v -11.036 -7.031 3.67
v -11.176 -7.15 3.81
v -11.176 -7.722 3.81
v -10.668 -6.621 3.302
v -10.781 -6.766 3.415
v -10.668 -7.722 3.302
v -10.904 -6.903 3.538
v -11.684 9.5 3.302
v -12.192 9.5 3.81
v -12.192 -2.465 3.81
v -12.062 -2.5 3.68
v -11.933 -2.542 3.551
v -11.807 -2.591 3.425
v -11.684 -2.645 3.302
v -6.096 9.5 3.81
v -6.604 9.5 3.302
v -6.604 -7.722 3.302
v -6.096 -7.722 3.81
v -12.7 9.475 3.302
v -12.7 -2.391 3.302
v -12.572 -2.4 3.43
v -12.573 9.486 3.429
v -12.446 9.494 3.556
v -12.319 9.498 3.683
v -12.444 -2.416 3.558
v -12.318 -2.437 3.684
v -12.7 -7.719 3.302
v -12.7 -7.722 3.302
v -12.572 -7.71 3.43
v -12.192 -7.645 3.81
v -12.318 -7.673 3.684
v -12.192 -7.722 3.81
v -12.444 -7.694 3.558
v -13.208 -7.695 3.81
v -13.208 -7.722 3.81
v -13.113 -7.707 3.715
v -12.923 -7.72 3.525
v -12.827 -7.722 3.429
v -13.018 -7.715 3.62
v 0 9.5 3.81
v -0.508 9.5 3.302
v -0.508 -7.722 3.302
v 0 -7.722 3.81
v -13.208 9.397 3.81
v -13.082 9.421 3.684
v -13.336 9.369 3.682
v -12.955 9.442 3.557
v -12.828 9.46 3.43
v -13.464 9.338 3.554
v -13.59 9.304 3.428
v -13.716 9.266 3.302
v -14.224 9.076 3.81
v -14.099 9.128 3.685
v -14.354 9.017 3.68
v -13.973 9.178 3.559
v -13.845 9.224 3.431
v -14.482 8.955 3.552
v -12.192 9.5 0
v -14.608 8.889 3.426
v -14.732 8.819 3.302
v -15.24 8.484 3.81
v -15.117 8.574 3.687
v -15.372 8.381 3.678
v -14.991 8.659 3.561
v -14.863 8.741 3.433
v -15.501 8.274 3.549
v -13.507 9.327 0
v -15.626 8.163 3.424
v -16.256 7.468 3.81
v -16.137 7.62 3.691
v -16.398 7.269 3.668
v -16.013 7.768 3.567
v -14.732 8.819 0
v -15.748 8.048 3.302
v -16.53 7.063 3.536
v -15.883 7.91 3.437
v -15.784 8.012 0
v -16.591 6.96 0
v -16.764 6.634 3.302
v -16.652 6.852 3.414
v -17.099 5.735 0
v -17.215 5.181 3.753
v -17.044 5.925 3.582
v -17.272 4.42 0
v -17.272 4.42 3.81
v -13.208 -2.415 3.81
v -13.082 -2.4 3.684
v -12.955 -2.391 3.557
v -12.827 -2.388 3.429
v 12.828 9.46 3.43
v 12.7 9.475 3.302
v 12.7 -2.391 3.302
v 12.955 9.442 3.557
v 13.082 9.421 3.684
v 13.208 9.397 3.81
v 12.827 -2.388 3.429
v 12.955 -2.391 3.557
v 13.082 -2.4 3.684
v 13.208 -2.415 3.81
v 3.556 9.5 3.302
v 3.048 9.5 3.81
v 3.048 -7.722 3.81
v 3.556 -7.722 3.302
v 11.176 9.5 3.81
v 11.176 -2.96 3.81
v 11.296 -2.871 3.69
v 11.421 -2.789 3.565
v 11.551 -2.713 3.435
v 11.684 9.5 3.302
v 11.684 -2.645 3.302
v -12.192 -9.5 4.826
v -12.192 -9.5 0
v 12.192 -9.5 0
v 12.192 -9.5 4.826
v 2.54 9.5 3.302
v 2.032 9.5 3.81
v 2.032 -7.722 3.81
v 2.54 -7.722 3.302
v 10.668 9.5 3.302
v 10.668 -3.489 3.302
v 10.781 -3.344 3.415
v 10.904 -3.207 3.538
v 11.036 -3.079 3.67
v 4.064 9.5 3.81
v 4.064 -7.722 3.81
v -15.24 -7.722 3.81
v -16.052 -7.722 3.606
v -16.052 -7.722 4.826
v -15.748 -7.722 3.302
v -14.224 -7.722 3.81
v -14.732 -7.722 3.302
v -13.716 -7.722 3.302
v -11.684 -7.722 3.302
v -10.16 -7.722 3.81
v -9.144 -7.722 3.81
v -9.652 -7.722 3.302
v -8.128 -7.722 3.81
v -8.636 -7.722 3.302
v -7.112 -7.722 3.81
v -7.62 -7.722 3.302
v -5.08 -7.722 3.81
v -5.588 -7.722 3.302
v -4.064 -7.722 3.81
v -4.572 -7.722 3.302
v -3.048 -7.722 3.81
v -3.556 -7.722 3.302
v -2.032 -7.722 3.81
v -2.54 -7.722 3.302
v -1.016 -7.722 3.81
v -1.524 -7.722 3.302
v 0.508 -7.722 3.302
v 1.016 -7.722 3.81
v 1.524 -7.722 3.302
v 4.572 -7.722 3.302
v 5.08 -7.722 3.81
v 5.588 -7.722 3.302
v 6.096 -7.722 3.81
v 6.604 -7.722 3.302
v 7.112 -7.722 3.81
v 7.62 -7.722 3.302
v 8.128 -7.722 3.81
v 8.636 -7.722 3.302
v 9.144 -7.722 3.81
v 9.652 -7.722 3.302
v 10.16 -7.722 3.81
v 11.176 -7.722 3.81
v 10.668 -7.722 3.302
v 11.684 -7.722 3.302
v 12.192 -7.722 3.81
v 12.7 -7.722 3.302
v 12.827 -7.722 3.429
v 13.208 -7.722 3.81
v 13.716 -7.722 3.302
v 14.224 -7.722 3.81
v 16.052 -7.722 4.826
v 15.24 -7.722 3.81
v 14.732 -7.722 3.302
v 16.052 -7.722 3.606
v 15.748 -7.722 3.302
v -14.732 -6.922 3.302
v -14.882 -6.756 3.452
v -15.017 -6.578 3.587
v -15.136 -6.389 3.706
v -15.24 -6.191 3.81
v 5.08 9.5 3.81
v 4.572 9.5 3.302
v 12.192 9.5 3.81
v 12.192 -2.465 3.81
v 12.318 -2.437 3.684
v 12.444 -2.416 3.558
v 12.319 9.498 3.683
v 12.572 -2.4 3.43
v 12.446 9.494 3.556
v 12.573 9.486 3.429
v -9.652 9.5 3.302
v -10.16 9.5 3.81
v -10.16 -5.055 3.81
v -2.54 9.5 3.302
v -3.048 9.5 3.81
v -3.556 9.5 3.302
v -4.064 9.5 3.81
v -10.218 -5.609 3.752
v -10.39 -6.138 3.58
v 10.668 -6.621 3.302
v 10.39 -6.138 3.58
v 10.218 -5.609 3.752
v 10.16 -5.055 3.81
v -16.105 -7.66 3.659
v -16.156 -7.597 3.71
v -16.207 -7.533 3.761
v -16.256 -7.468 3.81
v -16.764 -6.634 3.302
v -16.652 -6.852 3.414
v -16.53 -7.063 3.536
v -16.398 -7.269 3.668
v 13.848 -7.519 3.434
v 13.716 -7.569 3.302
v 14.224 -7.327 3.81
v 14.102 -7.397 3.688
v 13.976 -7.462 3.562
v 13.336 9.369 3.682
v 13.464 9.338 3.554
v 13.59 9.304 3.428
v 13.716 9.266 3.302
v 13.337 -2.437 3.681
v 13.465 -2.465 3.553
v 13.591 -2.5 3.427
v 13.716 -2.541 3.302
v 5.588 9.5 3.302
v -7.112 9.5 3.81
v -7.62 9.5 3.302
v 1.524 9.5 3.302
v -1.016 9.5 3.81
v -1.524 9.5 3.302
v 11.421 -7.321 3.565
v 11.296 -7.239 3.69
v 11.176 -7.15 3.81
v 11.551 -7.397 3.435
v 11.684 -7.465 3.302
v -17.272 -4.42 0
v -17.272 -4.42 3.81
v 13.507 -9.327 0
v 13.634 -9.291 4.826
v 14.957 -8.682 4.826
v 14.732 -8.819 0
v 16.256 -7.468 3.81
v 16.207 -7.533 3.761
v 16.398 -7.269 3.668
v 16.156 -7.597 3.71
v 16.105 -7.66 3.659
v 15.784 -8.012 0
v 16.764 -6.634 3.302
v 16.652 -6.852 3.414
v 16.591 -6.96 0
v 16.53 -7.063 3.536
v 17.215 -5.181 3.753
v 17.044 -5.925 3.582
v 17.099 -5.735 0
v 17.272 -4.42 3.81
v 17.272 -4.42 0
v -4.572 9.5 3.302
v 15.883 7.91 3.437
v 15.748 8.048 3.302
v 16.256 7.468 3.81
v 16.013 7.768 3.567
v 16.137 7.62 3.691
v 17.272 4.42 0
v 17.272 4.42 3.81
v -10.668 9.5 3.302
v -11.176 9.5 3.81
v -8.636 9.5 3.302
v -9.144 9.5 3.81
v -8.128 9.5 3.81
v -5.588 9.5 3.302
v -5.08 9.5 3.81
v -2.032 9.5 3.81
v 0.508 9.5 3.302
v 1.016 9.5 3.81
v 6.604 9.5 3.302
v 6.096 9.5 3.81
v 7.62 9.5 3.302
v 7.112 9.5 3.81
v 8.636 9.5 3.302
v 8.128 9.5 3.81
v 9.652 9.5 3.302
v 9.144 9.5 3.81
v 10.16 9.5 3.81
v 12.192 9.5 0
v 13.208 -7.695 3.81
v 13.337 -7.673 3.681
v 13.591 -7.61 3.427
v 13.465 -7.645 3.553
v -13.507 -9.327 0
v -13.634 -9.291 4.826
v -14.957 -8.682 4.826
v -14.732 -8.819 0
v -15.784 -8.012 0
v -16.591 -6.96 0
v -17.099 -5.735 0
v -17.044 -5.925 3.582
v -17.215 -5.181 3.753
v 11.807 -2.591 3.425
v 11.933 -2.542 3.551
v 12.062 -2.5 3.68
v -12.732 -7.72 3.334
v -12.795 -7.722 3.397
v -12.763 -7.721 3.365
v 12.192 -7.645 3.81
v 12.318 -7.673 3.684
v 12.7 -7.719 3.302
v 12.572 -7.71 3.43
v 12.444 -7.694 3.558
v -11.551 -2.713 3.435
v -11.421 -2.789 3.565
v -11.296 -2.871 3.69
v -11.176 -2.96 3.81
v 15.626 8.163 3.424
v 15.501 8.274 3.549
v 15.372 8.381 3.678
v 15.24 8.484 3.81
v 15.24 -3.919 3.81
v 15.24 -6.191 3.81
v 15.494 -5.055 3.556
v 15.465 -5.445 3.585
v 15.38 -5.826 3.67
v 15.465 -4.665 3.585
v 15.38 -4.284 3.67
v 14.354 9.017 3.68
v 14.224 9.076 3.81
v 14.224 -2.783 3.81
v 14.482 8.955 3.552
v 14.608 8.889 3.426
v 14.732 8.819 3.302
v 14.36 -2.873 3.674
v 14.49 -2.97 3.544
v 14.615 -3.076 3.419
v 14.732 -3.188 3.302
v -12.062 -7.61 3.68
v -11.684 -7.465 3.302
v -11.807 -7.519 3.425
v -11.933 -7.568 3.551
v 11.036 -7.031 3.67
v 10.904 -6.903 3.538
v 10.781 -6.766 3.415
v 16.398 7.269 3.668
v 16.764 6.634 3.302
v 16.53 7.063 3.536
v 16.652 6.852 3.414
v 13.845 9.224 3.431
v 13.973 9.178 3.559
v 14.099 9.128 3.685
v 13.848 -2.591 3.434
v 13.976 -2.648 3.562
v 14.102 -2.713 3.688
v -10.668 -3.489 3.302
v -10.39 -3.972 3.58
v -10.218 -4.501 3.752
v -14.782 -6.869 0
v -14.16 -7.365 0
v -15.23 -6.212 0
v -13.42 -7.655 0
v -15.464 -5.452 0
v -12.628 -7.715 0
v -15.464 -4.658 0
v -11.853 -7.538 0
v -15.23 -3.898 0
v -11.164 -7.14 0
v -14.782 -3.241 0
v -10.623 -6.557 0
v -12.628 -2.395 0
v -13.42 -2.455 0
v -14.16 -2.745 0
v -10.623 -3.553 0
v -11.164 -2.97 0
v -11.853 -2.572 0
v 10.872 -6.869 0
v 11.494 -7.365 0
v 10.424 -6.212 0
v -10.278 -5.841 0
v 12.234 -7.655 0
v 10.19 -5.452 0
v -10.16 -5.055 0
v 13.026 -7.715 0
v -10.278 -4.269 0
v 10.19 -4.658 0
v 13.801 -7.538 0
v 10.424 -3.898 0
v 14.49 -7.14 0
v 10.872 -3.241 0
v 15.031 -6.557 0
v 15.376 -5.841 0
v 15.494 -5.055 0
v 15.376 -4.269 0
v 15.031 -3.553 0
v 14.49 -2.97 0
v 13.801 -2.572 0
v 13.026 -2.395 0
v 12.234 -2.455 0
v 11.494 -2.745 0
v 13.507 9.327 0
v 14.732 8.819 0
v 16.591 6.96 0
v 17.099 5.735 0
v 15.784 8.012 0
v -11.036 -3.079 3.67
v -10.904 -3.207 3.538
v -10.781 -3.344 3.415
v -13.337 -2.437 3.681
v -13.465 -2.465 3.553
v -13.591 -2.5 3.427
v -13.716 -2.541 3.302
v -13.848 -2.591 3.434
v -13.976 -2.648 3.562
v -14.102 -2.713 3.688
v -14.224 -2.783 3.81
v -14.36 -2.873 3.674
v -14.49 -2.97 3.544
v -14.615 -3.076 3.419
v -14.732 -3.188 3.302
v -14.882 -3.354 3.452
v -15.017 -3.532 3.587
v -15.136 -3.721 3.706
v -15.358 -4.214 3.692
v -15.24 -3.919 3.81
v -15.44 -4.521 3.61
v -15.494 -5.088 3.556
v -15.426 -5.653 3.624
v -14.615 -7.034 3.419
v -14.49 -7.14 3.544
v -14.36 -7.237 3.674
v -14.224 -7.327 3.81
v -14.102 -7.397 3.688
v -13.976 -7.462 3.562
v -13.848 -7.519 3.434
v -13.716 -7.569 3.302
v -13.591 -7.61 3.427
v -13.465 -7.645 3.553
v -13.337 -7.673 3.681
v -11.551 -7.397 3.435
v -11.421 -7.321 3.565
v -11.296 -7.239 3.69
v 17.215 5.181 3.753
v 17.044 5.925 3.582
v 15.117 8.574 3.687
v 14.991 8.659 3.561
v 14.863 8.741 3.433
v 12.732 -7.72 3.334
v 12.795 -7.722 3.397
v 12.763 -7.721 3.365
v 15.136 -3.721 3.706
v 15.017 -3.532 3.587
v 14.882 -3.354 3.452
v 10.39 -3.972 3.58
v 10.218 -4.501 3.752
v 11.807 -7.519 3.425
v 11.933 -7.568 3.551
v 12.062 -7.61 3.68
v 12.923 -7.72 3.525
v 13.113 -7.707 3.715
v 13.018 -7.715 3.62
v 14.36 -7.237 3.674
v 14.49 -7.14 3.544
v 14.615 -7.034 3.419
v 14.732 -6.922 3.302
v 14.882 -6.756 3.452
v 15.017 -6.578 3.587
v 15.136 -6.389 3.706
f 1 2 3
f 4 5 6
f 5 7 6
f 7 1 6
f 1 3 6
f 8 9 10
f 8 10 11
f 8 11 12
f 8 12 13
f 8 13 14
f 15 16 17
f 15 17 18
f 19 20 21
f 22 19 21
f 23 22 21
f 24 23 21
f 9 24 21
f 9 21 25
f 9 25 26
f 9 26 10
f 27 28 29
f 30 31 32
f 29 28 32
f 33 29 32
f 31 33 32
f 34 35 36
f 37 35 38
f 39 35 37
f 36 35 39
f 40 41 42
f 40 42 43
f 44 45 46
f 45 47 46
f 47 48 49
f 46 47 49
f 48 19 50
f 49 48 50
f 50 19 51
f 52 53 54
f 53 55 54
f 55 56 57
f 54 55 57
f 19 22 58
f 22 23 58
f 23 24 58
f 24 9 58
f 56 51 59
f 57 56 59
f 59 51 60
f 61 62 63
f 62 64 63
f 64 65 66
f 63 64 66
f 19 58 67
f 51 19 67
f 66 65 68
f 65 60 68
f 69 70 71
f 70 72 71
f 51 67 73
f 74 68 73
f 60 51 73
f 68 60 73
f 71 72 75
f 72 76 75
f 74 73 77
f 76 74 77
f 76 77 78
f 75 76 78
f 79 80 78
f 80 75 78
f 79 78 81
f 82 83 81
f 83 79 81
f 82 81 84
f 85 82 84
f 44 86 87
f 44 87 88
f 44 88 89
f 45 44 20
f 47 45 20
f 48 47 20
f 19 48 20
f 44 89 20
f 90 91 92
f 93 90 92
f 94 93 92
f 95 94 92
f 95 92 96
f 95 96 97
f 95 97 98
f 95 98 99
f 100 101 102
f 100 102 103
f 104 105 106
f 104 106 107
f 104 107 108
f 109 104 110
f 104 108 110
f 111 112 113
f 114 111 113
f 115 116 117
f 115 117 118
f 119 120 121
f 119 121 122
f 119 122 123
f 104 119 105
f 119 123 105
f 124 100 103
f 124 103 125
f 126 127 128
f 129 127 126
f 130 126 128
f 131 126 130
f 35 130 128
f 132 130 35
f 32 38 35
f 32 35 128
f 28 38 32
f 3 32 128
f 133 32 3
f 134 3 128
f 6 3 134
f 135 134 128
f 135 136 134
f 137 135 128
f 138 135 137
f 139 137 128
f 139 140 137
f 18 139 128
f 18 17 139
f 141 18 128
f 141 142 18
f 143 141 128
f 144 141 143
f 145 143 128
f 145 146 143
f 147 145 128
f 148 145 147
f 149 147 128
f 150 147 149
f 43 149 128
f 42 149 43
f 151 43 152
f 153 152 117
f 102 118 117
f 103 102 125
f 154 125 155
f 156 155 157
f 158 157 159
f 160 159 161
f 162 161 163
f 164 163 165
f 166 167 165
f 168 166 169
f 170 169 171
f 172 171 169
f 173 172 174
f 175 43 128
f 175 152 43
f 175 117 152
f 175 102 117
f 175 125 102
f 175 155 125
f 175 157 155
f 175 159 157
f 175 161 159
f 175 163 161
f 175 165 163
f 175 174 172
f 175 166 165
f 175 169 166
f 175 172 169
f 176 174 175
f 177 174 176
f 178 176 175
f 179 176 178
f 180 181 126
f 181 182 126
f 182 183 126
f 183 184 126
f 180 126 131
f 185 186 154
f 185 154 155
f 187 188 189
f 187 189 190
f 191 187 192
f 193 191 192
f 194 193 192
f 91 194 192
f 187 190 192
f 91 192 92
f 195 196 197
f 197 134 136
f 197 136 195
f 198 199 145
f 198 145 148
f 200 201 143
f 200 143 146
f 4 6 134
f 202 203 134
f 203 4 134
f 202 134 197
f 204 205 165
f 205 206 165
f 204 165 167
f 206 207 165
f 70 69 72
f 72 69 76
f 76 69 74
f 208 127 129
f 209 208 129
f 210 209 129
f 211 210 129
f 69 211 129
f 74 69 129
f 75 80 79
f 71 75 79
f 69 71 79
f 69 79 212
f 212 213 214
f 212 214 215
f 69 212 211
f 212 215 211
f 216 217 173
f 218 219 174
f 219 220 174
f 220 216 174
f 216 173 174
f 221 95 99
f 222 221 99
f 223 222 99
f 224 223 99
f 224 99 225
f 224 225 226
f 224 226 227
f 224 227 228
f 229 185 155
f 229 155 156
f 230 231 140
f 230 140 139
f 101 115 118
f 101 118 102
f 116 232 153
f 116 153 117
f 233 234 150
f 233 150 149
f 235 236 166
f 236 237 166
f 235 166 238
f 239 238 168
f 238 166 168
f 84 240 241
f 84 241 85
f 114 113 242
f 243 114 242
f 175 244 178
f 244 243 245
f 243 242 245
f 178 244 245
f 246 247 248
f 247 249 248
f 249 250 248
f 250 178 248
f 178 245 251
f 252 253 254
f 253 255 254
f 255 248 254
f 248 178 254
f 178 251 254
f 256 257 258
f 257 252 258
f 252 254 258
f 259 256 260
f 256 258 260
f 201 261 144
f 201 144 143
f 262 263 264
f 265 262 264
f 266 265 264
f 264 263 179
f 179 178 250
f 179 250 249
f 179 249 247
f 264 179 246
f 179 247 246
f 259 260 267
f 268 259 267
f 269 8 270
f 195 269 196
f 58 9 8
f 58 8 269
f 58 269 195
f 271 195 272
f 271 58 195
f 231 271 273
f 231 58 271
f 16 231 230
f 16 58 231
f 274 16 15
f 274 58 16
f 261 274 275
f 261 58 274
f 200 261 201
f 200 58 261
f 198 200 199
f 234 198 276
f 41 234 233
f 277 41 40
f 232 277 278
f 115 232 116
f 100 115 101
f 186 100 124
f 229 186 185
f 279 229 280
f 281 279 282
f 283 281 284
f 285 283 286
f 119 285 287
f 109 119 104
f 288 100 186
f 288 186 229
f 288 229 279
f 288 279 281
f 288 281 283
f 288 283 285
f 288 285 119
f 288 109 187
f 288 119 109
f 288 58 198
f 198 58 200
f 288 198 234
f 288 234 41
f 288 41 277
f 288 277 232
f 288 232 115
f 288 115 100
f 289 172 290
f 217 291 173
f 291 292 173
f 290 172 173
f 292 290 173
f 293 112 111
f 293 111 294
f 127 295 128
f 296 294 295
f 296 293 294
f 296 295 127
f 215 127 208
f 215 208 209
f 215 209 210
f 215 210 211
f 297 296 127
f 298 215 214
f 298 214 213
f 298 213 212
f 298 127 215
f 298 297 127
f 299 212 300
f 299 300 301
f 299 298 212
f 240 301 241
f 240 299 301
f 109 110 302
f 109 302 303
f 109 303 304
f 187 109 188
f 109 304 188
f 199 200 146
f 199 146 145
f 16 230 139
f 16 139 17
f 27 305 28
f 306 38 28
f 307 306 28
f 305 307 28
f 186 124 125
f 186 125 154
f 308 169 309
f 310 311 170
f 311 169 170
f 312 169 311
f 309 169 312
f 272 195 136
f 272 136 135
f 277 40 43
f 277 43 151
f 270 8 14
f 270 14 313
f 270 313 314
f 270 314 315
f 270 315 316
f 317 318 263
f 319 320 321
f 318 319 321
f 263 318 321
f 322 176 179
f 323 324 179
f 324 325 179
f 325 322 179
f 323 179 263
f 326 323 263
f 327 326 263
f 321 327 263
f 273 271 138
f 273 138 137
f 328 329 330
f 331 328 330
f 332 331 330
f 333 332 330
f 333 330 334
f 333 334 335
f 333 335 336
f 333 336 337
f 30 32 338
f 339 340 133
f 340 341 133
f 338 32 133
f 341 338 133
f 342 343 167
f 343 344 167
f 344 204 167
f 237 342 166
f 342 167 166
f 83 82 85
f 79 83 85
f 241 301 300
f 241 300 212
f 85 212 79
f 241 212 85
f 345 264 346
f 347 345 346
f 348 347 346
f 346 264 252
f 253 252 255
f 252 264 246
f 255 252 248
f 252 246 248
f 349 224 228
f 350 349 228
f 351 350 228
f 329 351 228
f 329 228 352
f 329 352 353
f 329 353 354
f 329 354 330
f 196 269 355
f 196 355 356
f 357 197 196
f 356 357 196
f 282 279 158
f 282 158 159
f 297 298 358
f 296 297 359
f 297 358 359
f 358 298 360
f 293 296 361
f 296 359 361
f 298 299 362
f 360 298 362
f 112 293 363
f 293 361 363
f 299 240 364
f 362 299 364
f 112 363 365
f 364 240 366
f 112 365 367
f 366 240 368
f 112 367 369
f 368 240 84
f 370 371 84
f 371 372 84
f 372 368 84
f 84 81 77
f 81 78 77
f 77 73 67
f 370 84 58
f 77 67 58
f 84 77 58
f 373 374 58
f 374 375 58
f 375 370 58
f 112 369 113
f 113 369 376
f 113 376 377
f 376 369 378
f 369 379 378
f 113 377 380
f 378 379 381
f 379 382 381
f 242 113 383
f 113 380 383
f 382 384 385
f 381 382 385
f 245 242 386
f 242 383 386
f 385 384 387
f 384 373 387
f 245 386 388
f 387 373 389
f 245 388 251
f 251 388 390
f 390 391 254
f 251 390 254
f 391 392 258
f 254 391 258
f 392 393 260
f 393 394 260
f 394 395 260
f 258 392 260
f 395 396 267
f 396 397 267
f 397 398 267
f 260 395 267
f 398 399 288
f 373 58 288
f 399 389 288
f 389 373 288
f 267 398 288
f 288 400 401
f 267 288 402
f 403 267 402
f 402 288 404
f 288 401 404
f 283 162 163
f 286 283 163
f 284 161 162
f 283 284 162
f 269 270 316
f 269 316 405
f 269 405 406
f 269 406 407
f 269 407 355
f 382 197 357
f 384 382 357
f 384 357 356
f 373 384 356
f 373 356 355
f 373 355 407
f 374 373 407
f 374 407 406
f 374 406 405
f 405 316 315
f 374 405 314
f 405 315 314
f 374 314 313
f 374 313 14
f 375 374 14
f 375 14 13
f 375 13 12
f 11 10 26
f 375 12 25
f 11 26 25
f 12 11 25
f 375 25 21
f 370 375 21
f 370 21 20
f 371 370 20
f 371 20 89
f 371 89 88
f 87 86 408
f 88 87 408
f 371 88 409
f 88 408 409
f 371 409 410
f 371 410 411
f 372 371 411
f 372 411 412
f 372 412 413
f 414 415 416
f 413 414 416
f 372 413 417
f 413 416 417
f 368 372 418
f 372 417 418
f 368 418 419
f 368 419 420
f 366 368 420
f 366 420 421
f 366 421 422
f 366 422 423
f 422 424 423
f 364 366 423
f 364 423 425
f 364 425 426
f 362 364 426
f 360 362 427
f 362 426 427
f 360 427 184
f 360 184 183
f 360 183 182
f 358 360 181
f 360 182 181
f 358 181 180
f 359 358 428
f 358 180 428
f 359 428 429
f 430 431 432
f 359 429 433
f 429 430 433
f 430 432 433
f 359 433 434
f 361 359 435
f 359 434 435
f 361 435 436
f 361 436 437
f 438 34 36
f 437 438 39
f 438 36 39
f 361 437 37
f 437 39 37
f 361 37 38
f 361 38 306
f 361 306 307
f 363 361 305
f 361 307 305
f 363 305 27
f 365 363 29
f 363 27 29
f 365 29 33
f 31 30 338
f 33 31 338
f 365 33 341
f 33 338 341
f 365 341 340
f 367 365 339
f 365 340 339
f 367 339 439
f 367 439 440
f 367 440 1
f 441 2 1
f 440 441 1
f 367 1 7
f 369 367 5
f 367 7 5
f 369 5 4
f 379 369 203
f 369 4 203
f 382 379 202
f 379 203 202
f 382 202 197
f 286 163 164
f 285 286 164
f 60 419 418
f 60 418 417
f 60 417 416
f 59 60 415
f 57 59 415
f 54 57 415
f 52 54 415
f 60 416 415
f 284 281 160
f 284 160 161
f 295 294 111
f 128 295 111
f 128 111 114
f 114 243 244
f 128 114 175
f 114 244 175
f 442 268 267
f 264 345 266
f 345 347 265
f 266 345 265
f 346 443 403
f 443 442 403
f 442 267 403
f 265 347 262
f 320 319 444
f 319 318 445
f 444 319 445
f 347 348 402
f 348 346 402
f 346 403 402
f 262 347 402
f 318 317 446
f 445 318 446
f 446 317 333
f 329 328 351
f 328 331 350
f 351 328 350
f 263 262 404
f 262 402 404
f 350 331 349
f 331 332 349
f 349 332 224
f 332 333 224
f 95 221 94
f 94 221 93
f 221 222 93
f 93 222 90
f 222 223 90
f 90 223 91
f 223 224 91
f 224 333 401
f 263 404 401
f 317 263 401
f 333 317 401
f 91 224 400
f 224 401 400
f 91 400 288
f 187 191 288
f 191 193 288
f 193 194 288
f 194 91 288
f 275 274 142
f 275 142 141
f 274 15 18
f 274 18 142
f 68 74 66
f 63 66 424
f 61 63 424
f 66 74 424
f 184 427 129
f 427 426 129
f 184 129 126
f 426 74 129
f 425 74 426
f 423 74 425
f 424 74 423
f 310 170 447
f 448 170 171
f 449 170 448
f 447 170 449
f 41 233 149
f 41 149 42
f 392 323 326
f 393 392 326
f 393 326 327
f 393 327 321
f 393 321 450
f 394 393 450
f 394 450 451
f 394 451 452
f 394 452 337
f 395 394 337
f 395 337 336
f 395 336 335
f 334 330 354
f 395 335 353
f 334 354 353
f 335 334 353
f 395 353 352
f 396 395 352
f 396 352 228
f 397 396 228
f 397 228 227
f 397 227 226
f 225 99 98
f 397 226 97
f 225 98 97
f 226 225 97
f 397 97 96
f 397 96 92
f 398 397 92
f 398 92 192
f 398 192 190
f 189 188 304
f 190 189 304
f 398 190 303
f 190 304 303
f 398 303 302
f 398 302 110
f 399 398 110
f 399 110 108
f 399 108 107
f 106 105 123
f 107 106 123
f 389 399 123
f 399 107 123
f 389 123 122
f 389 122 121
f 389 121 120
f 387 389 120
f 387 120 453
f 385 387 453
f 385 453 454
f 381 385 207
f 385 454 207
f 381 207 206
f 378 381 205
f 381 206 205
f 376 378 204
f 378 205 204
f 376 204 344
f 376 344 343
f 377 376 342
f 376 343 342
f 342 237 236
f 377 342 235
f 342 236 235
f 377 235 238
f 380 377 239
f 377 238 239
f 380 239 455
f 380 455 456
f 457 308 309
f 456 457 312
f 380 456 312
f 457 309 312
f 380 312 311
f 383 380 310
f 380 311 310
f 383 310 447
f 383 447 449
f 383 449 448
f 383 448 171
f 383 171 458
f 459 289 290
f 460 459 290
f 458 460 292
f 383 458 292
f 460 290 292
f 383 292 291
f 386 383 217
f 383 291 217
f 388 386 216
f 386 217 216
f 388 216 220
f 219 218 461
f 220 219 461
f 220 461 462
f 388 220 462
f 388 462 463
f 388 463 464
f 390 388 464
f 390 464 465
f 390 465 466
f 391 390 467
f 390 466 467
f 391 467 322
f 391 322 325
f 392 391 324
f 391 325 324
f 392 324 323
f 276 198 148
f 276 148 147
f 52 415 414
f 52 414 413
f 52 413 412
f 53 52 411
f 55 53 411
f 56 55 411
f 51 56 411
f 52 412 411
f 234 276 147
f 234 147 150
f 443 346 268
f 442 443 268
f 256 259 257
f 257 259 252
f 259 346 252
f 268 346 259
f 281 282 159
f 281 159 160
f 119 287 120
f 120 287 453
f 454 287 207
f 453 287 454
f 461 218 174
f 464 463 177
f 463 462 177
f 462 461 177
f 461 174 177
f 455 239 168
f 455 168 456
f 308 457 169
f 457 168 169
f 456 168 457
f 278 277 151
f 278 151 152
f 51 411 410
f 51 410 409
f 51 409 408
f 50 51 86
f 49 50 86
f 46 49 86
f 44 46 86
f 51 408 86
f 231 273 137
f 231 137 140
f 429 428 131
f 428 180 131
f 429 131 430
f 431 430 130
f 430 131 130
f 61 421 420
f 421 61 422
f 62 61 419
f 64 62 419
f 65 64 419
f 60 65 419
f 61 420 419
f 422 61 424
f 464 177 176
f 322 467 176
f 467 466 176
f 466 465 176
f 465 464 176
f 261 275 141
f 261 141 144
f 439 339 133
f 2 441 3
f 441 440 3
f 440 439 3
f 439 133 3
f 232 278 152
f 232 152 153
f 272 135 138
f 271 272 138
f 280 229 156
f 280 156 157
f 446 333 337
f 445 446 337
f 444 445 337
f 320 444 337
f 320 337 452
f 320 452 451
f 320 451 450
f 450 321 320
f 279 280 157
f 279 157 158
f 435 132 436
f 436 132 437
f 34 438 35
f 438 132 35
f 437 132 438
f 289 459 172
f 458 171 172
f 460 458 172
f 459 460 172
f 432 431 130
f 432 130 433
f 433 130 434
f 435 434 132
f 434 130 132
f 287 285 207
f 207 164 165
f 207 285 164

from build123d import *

# Parameters (mm, degrees)
F0_W        = 34.544
F0_H        = 19
F1_DEPTH    = 3.81
F3_R        = 2.667
F4_DEPTH    = 10.16
F6_DEPTH    = 19.001
F7_W        = 34.544
F7_H        = 1.778
F8_DEPTH    = 4.826
F9_T1_DEPTH = 30.226
F9_T3_DEPTH = 29.21


# Not quite as in the source:
# - a fillet or chamfer that OpenCascade refuses, or shapes differently, is made with other operations: its cross-section is extruded or revolved along the edge and cut away or added


with BuildPart() as f1:
    # F0 (on Top) → F1 (new body)
    with BuildSketch(Plane.XY):
        Rectangle(F0_W, F0_H)
    extrude(amount=F1_DEPTH)

    # F3 (on face) → F4 (cut)
    with BuildSketch(Plane.XY.offset(3.81)):
        with Locations((-12.827, -5.055)):
            Circle(F3_R)
        with Locations((12.827, -5.055)):
            Circle(F3_R)
    extrude(amount=-F4_DEPTH, mode=Mode.SUBTRACT)

    # F5 (on face) → F6 (cut, through all)
    with BuildSketch(Plane.XZ.offset(9.5)):
        Polygon((-17.78, 3.302), (-17.272, 3.81), (-18.288, 3.81), align=None)
        Polygon((-16.764, 3.302), (-16.256, 3.81), (-17.272, 3.81), align=None)
        Polygon((-15.748, 3.302), (-15.24, 3.81), (-16.256, 3.81), align=None)
        Polygon((-14.732, 3.302), (-14.224, 3.81), (-15.24, 3.81), align=None)
        Polygon((-13.716, 3.302), (-13.208, 3.81), (-14.224, 3.81), align=None)
        Polygon((-12.7, 3.302), (-12.192, 3.81), (-13.208, 3.81), align=None)
        Polygon((-11.684, 3.302), (-11.176, 3.81), (-12.192, 3.81), align=None)
        Polygon((-10.668, 3.302), (-10.16, 3.81), (-11.176, 3.81), align=None)
        Polygon((-9.652, 3.302), (-9.144, 3.81), (-10.16, 3.81), align=None)
        Polygon((-8.636, 3.302), (-8.128, 3.81), (-9.144, 3.81), align=None)
        Polygon((-7.62, 3.302), (-7.112, 3.81), (-8.128, 3.81), align=None)
        Polygon((-6.604, 3.302), (-6.096, 3.81), (-7.112, 3.81), align=None)
        Polygon((-5.588, 3.302), (-5.08, 3.81), (-6.096, 3.81), align=None)
        Polygon((-4.572, 3.302), (-4.064, 3.81), (-5.08, 3.81), align=None)
        Polygon((-3.556, 3.302), (-3.048, 3.81), (-4.064, 3.81), align=None)
        Polygon((-2.54, 3.302), (-2.032, 3.81), (-3.048, 3.81), align=None)
        Polygon((-1.524, 3.302), (-1.016, 3.81), (-2.032, 3.81), align=None)
        Polygon((-0.508, 3.302), (0, 3.81), (-1.016, 3.81), align=None)
        Polygon((0.508, 3.302), (1.016, 3.81), (0, 3.81), align=None)
        Polygon((1.524, 3.302), (2.032, 3.81), (1.016, 3.81), align=None)
        Polygon((2.54, 3.302), (3.048, 3.81), (2.032, 3.81), align=None)
        Polygon((3.556, 3.302), (4.064, 3.81), (3.048, 3.81), align=None)
        Polygon((4.572, 3.302), (5.08, 3.81), (4.064, 3.81), align=None)
        Polygon((5.588, 3.302), (6.096, 3.81), (5.08, 3.81), align=None)
        Polygon((6.604, 3.302), (7.112, 3.81), (6.096, 3.81), align=None)
        Polygon((7.62, 3.302), (8.128, 3.81), (7.112, 3.81), align=None)
        Polygon((8.636, 3.302), (9.144, 3.81), (8.128, 3.81), align=None)
        Polygon((9.652, 3.302), (10.16, 3.81), (9.144, 3.81), align=None)
        Polygon((10.668, 3.302), (11.176, 3.81), (10.16, 3.81), align=None)
        Polygon((11.684, 3.302), (12.192, 3.81), (11.176, 3.81), align=None)
        Polygon((12.7, 3.302), (13.208, 3.81), (12.192, 3.81), align=None)
        Polygon((13.716, 3.302), (14.224, 3.81), (13.208, 3.81), align=None)
        Polygon((14.732, 3.302), (15.24, 3.81), (14.224, 3.81), align=None)
        Polygon((15.748, 3.302), (16.256, 3.81), (15.24, 3.81), align=None)
        Polygon((16.764, 3.302), (17.272, 3.81), (16.256, 3.81), align=None)
    extrude(amount=-F6_DEPTH, mode=Mode.SUBTRACT)

    # F7 (on face) → F8 (join)
    with BuildSketch(Plane(origin=(0, 0, 0), x_dir=(1, 0, 0), z_dir=(0, 0, -1))):
        with Locations((0, 8.611)):
            Rectangle(F7_W, F7_H)
    extrude(amount=-F8_DEPTH)

    # F9: fillet of radius 5.08 on 4 edges, made by hand

    # F9_s2 → F9_t1 (cut)
    with BuildSketch(Plane.XY.offset(-12.7)):
        with BuildLine():
            ThreePointArc((12.192, -9.5), (15.7841024484, -8.0121024484), (17.272, -4.42))
            Line((17.272, -4.42), (17.272, -9.5))
            Line((17.272, -9.5), (12.192, -9.5))
        make_face()
        with BuildLine():
            ThreePointArc((-12.192, -9.5), (-15.7841024484, -8.0121024484), (-17.272, -4.42))
            Line((-17.272, -4.42), (-17.272, -9.5))
            Line((-17.272, -9.5), (-12.192, -9.5))
        make_face()
    extrude(amount=F9_T1_DEPTH, mode=Mode.SUBTRACT)

    # F9_s4 → F9_t3 (cut)
    with BuildSketch(Plane.XY.offset(-12.7)):
        with BuildLine():
            ThreePointArc((17.272, 4.42), (15.7841024484, 8.0121024484), (12.192, 9.5))
            Line((12.192, 9.5), (17.272, 9.5))
            Line((17.272, 9.5), (17.272, 4.42))
        make_face()
        with BuildLine():
            ThreePointArc((-12.192, 9.5), (-15.7841024484, 8.0121024484), (-17.272, 4.42))
            Line((-17.272, 4.42), (-17.272, 9.5))
            Line((-17.272, 9.5), (-12.192, 9.5))
        make_face()
    extrude(amount=F9_T3_DEPTH, mode=Mode.SUBTRACT)


solid = f1.part
